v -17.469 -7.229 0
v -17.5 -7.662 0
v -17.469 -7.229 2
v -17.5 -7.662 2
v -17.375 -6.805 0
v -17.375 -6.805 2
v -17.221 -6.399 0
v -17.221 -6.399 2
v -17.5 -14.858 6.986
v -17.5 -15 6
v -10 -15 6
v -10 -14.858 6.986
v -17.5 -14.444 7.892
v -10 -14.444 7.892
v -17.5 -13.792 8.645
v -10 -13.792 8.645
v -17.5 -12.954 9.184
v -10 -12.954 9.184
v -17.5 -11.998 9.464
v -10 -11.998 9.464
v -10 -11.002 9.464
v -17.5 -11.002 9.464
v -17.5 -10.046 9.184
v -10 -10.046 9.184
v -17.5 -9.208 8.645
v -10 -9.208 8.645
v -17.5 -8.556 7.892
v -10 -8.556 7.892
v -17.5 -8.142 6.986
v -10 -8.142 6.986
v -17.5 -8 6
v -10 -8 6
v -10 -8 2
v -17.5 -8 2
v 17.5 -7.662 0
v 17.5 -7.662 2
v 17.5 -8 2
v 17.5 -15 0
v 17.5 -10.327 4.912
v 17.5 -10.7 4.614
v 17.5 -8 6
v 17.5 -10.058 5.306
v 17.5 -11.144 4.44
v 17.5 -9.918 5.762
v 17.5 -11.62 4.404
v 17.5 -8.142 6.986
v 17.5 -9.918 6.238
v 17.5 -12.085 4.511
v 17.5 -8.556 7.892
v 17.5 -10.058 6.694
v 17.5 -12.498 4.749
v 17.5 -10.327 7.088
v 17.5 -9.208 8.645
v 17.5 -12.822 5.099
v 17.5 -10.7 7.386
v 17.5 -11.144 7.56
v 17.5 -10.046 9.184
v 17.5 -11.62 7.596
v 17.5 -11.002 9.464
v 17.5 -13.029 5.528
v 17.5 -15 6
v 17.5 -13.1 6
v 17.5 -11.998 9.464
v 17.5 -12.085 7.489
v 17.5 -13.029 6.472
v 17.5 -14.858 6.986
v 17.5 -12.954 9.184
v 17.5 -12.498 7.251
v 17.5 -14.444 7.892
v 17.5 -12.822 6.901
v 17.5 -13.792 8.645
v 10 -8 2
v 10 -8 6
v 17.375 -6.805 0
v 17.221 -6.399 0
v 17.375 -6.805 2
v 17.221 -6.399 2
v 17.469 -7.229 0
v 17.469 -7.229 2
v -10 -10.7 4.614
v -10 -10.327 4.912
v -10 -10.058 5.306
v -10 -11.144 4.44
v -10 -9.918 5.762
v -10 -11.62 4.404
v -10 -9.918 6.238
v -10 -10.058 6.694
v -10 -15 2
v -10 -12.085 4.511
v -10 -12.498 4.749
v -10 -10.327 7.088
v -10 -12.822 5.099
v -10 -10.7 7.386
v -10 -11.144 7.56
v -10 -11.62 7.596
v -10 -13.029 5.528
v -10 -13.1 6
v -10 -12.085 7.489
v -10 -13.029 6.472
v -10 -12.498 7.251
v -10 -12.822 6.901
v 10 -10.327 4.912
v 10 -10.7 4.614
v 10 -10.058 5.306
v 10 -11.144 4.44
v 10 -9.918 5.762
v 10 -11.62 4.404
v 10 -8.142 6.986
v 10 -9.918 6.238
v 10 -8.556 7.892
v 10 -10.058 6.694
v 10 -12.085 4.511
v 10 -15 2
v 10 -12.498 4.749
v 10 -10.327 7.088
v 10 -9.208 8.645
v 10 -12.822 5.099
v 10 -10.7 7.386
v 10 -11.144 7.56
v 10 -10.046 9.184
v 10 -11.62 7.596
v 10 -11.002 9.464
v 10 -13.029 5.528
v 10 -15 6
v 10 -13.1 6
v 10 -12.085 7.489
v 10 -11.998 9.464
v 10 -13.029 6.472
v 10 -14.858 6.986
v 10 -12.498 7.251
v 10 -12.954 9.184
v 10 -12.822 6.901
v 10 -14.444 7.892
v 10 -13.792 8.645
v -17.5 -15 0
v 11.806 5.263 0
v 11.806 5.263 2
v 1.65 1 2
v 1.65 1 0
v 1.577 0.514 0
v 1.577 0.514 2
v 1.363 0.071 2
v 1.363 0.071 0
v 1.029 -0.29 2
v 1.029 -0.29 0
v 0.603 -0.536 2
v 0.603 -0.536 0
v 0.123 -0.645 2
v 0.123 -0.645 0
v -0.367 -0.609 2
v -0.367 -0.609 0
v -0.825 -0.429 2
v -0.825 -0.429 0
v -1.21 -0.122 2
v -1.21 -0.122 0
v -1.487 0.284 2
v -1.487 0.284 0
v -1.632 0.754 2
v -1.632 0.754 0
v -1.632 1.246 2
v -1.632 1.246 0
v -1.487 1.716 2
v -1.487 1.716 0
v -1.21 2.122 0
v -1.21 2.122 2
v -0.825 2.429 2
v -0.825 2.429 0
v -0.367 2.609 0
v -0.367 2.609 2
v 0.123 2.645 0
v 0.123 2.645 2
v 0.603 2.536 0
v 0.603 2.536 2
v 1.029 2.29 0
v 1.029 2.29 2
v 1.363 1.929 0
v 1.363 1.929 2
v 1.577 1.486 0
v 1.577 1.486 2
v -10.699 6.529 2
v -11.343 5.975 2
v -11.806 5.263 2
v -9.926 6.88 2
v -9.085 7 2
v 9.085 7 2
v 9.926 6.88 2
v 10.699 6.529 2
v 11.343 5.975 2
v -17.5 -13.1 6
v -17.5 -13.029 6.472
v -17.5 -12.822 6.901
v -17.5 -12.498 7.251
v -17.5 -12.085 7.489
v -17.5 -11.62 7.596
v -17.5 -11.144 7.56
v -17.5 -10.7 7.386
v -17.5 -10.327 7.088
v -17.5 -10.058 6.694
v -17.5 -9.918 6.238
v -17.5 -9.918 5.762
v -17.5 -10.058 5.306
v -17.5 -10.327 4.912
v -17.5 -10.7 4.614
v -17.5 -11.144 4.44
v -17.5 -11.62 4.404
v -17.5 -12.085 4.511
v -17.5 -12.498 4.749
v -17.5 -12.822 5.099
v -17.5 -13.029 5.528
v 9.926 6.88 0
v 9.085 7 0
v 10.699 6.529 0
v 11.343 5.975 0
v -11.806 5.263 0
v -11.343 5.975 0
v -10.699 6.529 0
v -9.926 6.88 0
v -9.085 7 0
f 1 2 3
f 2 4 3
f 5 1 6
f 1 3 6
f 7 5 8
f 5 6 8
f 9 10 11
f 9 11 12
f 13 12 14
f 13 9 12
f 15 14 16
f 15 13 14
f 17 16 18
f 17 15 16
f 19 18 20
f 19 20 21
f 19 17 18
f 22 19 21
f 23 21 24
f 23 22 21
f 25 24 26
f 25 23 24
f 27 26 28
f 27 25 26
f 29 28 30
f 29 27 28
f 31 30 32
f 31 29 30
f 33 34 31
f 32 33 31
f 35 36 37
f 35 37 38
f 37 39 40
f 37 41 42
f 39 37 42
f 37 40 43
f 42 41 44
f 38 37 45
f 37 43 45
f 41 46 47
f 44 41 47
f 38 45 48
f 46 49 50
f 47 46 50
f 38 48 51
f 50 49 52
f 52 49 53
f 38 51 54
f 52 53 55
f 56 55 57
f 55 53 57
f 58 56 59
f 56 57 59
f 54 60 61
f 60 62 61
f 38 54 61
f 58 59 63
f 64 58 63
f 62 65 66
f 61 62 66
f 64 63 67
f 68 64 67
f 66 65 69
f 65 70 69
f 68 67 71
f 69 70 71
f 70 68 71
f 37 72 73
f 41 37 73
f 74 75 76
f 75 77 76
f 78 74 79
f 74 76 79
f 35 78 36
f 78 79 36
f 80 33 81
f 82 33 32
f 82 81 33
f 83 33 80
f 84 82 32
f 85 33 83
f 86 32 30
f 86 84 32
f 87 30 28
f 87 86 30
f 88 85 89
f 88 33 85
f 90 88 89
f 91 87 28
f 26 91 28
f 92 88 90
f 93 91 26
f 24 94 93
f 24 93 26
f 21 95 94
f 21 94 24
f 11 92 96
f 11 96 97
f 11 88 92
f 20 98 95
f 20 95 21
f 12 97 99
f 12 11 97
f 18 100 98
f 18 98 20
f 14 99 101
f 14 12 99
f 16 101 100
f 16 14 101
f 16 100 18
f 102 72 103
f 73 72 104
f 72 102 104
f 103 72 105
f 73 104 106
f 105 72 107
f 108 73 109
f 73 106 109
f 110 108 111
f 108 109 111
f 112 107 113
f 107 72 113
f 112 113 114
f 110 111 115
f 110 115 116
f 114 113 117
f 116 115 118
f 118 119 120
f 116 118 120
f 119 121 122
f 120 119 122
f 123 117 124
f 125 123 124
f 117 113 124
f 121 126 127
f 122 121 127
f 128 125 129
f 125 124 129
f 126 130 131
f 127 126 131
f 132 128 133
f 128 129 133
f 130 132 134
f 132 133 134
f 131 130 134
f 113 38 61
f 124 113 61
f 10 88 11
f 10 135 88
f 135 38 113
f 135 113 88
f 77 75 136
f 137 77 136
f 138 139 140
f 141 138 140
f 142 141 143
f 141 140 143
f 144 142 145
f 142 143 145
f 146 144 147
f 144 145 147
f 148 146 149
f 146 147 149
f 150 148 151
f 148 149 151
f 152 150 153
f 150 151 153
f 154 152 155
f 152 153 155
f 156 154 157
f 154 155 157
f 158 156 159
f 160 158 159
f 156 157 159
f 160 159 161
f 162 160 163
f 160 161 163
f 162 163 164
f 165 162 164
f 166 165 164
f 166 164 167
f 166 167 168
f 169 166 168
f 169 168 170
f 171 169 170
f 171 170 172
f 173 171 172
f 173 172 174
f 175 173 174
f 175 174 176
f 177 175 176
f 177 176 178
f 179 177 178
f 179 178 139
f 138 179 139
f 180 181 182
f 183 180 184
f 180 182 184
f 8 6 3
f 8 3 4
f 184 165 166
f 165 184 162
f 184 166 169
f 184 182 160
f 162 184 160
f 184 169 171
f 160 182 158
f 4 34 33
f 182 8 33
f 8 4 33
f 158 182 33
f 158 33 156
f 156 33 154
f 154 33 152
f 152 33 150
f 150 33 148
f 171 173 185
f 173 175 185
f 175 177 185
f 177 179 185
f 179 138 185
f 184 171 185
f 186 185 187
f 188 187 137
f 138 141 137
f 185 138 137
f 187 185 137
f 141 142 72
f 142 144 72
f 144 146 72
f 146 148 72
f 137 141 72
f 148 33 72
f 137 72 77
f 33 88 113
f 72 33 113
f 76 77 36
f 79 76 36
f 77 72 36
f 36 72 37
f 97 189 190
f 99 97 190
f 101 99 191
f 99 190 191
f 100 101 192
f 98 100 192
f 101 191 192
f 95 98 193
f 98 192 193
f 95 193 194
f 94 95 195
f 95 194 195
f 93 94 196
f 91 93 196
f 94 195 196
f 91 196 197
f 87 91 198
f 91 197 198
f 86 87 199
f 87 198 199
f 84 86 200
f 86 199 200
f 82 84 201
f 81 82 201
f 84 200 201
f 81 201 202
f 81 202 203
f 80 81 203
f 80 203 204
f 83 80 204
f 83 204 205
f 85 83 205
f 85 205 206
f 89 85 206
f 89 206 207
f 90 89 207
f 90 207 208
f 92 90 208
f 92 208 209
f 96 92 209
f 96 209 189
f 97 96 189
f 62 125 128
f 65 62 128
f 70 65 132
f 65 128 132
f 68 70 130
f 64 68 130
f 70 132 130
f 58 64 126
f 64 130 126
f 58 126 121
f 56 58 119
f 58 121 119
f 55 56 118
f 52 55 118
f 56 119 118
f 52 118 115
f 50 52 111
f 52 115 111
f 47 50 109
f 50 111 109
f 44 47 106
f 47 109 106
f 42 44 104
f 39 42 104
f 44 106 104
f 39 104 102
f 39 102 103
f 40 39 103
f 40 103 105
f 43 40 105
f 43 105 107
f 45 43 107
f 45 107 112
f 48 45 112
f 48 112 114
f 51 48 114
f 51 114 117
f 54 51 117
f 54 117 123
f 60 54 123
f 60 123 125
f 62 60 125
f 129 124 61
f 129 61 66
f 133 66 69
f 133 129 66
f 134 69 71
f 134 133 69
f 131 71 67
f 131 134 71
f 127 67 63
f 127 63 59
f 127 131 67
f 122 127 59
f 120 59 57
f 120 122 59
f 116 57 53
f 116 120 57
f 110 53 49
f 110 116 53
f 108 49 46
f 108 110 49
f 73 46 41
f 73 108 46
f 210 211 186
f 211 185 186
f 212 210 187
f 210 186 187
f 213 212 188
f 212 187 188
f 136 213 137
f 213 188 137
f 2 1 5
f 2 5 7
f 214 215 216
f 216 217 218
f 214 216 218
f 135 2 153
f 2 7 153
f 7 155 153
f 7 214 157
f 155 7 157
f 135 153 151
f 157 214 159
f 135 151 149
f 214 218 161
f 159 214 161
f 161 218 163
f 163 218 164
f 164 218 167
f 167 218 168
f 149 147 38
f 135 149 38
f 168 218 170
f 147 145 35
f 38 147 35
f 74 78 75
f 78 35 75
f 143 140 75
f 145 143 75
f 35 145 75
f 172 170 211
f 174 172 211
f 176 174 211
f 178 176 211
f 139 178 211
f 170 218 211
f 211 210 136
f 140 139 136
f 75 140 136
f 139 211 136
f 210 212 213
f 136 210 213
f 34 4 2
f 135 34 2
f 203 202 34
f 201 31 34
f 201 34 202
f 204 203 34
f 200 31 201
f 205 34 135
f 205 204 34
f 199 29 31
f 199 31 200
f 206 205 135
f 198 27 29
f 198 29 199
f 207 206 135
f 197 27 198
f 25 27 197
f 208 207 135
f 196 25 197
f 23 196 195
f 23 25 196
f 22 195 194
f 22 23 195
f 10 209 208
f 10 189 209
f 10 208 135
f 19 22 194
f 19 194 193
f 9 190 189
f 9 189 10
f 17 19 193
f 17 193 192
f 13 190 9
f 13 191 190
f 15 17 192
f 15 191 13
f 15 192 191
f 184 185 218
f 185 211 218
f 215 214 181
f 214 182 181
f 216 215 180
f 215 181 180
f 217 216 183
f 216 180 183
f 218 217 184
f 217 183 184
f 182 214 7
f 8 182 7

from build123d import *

# Parameters (mm, degrees)
PAD_DEPTH       = 2
PAD001_DEPTH    = 35
SKETCH002_R     = 1.6
POCKET_DEPTH    = 35.001
SKETCH003_W     = 20
SKETCH003_H     = 10
POCKET001_DEPTH = 22.001
FILLET_R        = 3
SKETCH004_R     = 1.65
POCKET002_DEPTH = 5


with BuildPart() as part:
    # Sketch → Pad (new body)
    with BuildSketch(Plane.XY):
        Polygon((-17.5, -15), (17.5, -15), (17.5, -7), (11, 7), (-11, 7), (-17.5, -7), align=None)
    extrude(amount=PAD_DEPTH)

    # Sketch001 (on Face6 of Pad) → Pad001 (join)
    with BuildSketch(Plane(origin=(-17.5, 0, 0), x_dir=(0, -1, 0), z_dir=(-1, 0, 0))):
        with BuildLine():
            Line((15, 2), (15, 6))
            ThreePointArc((15, 6), (11.5, 9.5), (8, 6))
            Line((8, 2), (8, 6))
            Line((8, 2), (15, 2))
        make_face()
    extrude(amount=-PAD001_DEPTH)

    # Sketch002 (on Face8 of Pad001) → Pocket (cut, through all)
    with BuildSketch(Plane(origin=(-17.5, 0, 0), x_dir=(0, -1, 0), z_dir=(-1, 0, 0))):
        with Locations((11.5, 6)):
            Circle(SKETCH002_R)
    extrude(amount=-POCKET_DEPTH, mode=Mode.SUBTRACT)

    # Sketch003 (on Face1 of Pocket) → Pocket001 (cut, through all)
    with BuildSketch(Plane.XZ.offset(15)):
        with Locations((0, 7)):
            Rectangle(SKETCH003_W, SKETCH003_H)
    extrude(amount=-POCKET001_DEPTH, mode=Mode.SUBTRACT)

    # Fillet
    fillet_edges = [part.edges().sort_by_distance(p)[0] for p in [
        (-11, 7, 1),
        (-17.5, -7, 1),
        (11, 7, 1),
        (17.5, -7, 1),
    ]]
    fillet(fillet_edges, radius=FILLET_R)

    # Sketch004 (on Face2 of Fillet) → Pocket002 (cut)
    with BuildSketch(Plane(origin=(0, 0, 0), x_dir=(1, 0, 0), z_dir=(0, 0, -1))):
        with Locations((0, -1)):
            Circle(SKETCH004_R)
    extrude(amount=-POCKET002_DEPTH, mode=Mode.SUBTRACT)


solid = part.part
